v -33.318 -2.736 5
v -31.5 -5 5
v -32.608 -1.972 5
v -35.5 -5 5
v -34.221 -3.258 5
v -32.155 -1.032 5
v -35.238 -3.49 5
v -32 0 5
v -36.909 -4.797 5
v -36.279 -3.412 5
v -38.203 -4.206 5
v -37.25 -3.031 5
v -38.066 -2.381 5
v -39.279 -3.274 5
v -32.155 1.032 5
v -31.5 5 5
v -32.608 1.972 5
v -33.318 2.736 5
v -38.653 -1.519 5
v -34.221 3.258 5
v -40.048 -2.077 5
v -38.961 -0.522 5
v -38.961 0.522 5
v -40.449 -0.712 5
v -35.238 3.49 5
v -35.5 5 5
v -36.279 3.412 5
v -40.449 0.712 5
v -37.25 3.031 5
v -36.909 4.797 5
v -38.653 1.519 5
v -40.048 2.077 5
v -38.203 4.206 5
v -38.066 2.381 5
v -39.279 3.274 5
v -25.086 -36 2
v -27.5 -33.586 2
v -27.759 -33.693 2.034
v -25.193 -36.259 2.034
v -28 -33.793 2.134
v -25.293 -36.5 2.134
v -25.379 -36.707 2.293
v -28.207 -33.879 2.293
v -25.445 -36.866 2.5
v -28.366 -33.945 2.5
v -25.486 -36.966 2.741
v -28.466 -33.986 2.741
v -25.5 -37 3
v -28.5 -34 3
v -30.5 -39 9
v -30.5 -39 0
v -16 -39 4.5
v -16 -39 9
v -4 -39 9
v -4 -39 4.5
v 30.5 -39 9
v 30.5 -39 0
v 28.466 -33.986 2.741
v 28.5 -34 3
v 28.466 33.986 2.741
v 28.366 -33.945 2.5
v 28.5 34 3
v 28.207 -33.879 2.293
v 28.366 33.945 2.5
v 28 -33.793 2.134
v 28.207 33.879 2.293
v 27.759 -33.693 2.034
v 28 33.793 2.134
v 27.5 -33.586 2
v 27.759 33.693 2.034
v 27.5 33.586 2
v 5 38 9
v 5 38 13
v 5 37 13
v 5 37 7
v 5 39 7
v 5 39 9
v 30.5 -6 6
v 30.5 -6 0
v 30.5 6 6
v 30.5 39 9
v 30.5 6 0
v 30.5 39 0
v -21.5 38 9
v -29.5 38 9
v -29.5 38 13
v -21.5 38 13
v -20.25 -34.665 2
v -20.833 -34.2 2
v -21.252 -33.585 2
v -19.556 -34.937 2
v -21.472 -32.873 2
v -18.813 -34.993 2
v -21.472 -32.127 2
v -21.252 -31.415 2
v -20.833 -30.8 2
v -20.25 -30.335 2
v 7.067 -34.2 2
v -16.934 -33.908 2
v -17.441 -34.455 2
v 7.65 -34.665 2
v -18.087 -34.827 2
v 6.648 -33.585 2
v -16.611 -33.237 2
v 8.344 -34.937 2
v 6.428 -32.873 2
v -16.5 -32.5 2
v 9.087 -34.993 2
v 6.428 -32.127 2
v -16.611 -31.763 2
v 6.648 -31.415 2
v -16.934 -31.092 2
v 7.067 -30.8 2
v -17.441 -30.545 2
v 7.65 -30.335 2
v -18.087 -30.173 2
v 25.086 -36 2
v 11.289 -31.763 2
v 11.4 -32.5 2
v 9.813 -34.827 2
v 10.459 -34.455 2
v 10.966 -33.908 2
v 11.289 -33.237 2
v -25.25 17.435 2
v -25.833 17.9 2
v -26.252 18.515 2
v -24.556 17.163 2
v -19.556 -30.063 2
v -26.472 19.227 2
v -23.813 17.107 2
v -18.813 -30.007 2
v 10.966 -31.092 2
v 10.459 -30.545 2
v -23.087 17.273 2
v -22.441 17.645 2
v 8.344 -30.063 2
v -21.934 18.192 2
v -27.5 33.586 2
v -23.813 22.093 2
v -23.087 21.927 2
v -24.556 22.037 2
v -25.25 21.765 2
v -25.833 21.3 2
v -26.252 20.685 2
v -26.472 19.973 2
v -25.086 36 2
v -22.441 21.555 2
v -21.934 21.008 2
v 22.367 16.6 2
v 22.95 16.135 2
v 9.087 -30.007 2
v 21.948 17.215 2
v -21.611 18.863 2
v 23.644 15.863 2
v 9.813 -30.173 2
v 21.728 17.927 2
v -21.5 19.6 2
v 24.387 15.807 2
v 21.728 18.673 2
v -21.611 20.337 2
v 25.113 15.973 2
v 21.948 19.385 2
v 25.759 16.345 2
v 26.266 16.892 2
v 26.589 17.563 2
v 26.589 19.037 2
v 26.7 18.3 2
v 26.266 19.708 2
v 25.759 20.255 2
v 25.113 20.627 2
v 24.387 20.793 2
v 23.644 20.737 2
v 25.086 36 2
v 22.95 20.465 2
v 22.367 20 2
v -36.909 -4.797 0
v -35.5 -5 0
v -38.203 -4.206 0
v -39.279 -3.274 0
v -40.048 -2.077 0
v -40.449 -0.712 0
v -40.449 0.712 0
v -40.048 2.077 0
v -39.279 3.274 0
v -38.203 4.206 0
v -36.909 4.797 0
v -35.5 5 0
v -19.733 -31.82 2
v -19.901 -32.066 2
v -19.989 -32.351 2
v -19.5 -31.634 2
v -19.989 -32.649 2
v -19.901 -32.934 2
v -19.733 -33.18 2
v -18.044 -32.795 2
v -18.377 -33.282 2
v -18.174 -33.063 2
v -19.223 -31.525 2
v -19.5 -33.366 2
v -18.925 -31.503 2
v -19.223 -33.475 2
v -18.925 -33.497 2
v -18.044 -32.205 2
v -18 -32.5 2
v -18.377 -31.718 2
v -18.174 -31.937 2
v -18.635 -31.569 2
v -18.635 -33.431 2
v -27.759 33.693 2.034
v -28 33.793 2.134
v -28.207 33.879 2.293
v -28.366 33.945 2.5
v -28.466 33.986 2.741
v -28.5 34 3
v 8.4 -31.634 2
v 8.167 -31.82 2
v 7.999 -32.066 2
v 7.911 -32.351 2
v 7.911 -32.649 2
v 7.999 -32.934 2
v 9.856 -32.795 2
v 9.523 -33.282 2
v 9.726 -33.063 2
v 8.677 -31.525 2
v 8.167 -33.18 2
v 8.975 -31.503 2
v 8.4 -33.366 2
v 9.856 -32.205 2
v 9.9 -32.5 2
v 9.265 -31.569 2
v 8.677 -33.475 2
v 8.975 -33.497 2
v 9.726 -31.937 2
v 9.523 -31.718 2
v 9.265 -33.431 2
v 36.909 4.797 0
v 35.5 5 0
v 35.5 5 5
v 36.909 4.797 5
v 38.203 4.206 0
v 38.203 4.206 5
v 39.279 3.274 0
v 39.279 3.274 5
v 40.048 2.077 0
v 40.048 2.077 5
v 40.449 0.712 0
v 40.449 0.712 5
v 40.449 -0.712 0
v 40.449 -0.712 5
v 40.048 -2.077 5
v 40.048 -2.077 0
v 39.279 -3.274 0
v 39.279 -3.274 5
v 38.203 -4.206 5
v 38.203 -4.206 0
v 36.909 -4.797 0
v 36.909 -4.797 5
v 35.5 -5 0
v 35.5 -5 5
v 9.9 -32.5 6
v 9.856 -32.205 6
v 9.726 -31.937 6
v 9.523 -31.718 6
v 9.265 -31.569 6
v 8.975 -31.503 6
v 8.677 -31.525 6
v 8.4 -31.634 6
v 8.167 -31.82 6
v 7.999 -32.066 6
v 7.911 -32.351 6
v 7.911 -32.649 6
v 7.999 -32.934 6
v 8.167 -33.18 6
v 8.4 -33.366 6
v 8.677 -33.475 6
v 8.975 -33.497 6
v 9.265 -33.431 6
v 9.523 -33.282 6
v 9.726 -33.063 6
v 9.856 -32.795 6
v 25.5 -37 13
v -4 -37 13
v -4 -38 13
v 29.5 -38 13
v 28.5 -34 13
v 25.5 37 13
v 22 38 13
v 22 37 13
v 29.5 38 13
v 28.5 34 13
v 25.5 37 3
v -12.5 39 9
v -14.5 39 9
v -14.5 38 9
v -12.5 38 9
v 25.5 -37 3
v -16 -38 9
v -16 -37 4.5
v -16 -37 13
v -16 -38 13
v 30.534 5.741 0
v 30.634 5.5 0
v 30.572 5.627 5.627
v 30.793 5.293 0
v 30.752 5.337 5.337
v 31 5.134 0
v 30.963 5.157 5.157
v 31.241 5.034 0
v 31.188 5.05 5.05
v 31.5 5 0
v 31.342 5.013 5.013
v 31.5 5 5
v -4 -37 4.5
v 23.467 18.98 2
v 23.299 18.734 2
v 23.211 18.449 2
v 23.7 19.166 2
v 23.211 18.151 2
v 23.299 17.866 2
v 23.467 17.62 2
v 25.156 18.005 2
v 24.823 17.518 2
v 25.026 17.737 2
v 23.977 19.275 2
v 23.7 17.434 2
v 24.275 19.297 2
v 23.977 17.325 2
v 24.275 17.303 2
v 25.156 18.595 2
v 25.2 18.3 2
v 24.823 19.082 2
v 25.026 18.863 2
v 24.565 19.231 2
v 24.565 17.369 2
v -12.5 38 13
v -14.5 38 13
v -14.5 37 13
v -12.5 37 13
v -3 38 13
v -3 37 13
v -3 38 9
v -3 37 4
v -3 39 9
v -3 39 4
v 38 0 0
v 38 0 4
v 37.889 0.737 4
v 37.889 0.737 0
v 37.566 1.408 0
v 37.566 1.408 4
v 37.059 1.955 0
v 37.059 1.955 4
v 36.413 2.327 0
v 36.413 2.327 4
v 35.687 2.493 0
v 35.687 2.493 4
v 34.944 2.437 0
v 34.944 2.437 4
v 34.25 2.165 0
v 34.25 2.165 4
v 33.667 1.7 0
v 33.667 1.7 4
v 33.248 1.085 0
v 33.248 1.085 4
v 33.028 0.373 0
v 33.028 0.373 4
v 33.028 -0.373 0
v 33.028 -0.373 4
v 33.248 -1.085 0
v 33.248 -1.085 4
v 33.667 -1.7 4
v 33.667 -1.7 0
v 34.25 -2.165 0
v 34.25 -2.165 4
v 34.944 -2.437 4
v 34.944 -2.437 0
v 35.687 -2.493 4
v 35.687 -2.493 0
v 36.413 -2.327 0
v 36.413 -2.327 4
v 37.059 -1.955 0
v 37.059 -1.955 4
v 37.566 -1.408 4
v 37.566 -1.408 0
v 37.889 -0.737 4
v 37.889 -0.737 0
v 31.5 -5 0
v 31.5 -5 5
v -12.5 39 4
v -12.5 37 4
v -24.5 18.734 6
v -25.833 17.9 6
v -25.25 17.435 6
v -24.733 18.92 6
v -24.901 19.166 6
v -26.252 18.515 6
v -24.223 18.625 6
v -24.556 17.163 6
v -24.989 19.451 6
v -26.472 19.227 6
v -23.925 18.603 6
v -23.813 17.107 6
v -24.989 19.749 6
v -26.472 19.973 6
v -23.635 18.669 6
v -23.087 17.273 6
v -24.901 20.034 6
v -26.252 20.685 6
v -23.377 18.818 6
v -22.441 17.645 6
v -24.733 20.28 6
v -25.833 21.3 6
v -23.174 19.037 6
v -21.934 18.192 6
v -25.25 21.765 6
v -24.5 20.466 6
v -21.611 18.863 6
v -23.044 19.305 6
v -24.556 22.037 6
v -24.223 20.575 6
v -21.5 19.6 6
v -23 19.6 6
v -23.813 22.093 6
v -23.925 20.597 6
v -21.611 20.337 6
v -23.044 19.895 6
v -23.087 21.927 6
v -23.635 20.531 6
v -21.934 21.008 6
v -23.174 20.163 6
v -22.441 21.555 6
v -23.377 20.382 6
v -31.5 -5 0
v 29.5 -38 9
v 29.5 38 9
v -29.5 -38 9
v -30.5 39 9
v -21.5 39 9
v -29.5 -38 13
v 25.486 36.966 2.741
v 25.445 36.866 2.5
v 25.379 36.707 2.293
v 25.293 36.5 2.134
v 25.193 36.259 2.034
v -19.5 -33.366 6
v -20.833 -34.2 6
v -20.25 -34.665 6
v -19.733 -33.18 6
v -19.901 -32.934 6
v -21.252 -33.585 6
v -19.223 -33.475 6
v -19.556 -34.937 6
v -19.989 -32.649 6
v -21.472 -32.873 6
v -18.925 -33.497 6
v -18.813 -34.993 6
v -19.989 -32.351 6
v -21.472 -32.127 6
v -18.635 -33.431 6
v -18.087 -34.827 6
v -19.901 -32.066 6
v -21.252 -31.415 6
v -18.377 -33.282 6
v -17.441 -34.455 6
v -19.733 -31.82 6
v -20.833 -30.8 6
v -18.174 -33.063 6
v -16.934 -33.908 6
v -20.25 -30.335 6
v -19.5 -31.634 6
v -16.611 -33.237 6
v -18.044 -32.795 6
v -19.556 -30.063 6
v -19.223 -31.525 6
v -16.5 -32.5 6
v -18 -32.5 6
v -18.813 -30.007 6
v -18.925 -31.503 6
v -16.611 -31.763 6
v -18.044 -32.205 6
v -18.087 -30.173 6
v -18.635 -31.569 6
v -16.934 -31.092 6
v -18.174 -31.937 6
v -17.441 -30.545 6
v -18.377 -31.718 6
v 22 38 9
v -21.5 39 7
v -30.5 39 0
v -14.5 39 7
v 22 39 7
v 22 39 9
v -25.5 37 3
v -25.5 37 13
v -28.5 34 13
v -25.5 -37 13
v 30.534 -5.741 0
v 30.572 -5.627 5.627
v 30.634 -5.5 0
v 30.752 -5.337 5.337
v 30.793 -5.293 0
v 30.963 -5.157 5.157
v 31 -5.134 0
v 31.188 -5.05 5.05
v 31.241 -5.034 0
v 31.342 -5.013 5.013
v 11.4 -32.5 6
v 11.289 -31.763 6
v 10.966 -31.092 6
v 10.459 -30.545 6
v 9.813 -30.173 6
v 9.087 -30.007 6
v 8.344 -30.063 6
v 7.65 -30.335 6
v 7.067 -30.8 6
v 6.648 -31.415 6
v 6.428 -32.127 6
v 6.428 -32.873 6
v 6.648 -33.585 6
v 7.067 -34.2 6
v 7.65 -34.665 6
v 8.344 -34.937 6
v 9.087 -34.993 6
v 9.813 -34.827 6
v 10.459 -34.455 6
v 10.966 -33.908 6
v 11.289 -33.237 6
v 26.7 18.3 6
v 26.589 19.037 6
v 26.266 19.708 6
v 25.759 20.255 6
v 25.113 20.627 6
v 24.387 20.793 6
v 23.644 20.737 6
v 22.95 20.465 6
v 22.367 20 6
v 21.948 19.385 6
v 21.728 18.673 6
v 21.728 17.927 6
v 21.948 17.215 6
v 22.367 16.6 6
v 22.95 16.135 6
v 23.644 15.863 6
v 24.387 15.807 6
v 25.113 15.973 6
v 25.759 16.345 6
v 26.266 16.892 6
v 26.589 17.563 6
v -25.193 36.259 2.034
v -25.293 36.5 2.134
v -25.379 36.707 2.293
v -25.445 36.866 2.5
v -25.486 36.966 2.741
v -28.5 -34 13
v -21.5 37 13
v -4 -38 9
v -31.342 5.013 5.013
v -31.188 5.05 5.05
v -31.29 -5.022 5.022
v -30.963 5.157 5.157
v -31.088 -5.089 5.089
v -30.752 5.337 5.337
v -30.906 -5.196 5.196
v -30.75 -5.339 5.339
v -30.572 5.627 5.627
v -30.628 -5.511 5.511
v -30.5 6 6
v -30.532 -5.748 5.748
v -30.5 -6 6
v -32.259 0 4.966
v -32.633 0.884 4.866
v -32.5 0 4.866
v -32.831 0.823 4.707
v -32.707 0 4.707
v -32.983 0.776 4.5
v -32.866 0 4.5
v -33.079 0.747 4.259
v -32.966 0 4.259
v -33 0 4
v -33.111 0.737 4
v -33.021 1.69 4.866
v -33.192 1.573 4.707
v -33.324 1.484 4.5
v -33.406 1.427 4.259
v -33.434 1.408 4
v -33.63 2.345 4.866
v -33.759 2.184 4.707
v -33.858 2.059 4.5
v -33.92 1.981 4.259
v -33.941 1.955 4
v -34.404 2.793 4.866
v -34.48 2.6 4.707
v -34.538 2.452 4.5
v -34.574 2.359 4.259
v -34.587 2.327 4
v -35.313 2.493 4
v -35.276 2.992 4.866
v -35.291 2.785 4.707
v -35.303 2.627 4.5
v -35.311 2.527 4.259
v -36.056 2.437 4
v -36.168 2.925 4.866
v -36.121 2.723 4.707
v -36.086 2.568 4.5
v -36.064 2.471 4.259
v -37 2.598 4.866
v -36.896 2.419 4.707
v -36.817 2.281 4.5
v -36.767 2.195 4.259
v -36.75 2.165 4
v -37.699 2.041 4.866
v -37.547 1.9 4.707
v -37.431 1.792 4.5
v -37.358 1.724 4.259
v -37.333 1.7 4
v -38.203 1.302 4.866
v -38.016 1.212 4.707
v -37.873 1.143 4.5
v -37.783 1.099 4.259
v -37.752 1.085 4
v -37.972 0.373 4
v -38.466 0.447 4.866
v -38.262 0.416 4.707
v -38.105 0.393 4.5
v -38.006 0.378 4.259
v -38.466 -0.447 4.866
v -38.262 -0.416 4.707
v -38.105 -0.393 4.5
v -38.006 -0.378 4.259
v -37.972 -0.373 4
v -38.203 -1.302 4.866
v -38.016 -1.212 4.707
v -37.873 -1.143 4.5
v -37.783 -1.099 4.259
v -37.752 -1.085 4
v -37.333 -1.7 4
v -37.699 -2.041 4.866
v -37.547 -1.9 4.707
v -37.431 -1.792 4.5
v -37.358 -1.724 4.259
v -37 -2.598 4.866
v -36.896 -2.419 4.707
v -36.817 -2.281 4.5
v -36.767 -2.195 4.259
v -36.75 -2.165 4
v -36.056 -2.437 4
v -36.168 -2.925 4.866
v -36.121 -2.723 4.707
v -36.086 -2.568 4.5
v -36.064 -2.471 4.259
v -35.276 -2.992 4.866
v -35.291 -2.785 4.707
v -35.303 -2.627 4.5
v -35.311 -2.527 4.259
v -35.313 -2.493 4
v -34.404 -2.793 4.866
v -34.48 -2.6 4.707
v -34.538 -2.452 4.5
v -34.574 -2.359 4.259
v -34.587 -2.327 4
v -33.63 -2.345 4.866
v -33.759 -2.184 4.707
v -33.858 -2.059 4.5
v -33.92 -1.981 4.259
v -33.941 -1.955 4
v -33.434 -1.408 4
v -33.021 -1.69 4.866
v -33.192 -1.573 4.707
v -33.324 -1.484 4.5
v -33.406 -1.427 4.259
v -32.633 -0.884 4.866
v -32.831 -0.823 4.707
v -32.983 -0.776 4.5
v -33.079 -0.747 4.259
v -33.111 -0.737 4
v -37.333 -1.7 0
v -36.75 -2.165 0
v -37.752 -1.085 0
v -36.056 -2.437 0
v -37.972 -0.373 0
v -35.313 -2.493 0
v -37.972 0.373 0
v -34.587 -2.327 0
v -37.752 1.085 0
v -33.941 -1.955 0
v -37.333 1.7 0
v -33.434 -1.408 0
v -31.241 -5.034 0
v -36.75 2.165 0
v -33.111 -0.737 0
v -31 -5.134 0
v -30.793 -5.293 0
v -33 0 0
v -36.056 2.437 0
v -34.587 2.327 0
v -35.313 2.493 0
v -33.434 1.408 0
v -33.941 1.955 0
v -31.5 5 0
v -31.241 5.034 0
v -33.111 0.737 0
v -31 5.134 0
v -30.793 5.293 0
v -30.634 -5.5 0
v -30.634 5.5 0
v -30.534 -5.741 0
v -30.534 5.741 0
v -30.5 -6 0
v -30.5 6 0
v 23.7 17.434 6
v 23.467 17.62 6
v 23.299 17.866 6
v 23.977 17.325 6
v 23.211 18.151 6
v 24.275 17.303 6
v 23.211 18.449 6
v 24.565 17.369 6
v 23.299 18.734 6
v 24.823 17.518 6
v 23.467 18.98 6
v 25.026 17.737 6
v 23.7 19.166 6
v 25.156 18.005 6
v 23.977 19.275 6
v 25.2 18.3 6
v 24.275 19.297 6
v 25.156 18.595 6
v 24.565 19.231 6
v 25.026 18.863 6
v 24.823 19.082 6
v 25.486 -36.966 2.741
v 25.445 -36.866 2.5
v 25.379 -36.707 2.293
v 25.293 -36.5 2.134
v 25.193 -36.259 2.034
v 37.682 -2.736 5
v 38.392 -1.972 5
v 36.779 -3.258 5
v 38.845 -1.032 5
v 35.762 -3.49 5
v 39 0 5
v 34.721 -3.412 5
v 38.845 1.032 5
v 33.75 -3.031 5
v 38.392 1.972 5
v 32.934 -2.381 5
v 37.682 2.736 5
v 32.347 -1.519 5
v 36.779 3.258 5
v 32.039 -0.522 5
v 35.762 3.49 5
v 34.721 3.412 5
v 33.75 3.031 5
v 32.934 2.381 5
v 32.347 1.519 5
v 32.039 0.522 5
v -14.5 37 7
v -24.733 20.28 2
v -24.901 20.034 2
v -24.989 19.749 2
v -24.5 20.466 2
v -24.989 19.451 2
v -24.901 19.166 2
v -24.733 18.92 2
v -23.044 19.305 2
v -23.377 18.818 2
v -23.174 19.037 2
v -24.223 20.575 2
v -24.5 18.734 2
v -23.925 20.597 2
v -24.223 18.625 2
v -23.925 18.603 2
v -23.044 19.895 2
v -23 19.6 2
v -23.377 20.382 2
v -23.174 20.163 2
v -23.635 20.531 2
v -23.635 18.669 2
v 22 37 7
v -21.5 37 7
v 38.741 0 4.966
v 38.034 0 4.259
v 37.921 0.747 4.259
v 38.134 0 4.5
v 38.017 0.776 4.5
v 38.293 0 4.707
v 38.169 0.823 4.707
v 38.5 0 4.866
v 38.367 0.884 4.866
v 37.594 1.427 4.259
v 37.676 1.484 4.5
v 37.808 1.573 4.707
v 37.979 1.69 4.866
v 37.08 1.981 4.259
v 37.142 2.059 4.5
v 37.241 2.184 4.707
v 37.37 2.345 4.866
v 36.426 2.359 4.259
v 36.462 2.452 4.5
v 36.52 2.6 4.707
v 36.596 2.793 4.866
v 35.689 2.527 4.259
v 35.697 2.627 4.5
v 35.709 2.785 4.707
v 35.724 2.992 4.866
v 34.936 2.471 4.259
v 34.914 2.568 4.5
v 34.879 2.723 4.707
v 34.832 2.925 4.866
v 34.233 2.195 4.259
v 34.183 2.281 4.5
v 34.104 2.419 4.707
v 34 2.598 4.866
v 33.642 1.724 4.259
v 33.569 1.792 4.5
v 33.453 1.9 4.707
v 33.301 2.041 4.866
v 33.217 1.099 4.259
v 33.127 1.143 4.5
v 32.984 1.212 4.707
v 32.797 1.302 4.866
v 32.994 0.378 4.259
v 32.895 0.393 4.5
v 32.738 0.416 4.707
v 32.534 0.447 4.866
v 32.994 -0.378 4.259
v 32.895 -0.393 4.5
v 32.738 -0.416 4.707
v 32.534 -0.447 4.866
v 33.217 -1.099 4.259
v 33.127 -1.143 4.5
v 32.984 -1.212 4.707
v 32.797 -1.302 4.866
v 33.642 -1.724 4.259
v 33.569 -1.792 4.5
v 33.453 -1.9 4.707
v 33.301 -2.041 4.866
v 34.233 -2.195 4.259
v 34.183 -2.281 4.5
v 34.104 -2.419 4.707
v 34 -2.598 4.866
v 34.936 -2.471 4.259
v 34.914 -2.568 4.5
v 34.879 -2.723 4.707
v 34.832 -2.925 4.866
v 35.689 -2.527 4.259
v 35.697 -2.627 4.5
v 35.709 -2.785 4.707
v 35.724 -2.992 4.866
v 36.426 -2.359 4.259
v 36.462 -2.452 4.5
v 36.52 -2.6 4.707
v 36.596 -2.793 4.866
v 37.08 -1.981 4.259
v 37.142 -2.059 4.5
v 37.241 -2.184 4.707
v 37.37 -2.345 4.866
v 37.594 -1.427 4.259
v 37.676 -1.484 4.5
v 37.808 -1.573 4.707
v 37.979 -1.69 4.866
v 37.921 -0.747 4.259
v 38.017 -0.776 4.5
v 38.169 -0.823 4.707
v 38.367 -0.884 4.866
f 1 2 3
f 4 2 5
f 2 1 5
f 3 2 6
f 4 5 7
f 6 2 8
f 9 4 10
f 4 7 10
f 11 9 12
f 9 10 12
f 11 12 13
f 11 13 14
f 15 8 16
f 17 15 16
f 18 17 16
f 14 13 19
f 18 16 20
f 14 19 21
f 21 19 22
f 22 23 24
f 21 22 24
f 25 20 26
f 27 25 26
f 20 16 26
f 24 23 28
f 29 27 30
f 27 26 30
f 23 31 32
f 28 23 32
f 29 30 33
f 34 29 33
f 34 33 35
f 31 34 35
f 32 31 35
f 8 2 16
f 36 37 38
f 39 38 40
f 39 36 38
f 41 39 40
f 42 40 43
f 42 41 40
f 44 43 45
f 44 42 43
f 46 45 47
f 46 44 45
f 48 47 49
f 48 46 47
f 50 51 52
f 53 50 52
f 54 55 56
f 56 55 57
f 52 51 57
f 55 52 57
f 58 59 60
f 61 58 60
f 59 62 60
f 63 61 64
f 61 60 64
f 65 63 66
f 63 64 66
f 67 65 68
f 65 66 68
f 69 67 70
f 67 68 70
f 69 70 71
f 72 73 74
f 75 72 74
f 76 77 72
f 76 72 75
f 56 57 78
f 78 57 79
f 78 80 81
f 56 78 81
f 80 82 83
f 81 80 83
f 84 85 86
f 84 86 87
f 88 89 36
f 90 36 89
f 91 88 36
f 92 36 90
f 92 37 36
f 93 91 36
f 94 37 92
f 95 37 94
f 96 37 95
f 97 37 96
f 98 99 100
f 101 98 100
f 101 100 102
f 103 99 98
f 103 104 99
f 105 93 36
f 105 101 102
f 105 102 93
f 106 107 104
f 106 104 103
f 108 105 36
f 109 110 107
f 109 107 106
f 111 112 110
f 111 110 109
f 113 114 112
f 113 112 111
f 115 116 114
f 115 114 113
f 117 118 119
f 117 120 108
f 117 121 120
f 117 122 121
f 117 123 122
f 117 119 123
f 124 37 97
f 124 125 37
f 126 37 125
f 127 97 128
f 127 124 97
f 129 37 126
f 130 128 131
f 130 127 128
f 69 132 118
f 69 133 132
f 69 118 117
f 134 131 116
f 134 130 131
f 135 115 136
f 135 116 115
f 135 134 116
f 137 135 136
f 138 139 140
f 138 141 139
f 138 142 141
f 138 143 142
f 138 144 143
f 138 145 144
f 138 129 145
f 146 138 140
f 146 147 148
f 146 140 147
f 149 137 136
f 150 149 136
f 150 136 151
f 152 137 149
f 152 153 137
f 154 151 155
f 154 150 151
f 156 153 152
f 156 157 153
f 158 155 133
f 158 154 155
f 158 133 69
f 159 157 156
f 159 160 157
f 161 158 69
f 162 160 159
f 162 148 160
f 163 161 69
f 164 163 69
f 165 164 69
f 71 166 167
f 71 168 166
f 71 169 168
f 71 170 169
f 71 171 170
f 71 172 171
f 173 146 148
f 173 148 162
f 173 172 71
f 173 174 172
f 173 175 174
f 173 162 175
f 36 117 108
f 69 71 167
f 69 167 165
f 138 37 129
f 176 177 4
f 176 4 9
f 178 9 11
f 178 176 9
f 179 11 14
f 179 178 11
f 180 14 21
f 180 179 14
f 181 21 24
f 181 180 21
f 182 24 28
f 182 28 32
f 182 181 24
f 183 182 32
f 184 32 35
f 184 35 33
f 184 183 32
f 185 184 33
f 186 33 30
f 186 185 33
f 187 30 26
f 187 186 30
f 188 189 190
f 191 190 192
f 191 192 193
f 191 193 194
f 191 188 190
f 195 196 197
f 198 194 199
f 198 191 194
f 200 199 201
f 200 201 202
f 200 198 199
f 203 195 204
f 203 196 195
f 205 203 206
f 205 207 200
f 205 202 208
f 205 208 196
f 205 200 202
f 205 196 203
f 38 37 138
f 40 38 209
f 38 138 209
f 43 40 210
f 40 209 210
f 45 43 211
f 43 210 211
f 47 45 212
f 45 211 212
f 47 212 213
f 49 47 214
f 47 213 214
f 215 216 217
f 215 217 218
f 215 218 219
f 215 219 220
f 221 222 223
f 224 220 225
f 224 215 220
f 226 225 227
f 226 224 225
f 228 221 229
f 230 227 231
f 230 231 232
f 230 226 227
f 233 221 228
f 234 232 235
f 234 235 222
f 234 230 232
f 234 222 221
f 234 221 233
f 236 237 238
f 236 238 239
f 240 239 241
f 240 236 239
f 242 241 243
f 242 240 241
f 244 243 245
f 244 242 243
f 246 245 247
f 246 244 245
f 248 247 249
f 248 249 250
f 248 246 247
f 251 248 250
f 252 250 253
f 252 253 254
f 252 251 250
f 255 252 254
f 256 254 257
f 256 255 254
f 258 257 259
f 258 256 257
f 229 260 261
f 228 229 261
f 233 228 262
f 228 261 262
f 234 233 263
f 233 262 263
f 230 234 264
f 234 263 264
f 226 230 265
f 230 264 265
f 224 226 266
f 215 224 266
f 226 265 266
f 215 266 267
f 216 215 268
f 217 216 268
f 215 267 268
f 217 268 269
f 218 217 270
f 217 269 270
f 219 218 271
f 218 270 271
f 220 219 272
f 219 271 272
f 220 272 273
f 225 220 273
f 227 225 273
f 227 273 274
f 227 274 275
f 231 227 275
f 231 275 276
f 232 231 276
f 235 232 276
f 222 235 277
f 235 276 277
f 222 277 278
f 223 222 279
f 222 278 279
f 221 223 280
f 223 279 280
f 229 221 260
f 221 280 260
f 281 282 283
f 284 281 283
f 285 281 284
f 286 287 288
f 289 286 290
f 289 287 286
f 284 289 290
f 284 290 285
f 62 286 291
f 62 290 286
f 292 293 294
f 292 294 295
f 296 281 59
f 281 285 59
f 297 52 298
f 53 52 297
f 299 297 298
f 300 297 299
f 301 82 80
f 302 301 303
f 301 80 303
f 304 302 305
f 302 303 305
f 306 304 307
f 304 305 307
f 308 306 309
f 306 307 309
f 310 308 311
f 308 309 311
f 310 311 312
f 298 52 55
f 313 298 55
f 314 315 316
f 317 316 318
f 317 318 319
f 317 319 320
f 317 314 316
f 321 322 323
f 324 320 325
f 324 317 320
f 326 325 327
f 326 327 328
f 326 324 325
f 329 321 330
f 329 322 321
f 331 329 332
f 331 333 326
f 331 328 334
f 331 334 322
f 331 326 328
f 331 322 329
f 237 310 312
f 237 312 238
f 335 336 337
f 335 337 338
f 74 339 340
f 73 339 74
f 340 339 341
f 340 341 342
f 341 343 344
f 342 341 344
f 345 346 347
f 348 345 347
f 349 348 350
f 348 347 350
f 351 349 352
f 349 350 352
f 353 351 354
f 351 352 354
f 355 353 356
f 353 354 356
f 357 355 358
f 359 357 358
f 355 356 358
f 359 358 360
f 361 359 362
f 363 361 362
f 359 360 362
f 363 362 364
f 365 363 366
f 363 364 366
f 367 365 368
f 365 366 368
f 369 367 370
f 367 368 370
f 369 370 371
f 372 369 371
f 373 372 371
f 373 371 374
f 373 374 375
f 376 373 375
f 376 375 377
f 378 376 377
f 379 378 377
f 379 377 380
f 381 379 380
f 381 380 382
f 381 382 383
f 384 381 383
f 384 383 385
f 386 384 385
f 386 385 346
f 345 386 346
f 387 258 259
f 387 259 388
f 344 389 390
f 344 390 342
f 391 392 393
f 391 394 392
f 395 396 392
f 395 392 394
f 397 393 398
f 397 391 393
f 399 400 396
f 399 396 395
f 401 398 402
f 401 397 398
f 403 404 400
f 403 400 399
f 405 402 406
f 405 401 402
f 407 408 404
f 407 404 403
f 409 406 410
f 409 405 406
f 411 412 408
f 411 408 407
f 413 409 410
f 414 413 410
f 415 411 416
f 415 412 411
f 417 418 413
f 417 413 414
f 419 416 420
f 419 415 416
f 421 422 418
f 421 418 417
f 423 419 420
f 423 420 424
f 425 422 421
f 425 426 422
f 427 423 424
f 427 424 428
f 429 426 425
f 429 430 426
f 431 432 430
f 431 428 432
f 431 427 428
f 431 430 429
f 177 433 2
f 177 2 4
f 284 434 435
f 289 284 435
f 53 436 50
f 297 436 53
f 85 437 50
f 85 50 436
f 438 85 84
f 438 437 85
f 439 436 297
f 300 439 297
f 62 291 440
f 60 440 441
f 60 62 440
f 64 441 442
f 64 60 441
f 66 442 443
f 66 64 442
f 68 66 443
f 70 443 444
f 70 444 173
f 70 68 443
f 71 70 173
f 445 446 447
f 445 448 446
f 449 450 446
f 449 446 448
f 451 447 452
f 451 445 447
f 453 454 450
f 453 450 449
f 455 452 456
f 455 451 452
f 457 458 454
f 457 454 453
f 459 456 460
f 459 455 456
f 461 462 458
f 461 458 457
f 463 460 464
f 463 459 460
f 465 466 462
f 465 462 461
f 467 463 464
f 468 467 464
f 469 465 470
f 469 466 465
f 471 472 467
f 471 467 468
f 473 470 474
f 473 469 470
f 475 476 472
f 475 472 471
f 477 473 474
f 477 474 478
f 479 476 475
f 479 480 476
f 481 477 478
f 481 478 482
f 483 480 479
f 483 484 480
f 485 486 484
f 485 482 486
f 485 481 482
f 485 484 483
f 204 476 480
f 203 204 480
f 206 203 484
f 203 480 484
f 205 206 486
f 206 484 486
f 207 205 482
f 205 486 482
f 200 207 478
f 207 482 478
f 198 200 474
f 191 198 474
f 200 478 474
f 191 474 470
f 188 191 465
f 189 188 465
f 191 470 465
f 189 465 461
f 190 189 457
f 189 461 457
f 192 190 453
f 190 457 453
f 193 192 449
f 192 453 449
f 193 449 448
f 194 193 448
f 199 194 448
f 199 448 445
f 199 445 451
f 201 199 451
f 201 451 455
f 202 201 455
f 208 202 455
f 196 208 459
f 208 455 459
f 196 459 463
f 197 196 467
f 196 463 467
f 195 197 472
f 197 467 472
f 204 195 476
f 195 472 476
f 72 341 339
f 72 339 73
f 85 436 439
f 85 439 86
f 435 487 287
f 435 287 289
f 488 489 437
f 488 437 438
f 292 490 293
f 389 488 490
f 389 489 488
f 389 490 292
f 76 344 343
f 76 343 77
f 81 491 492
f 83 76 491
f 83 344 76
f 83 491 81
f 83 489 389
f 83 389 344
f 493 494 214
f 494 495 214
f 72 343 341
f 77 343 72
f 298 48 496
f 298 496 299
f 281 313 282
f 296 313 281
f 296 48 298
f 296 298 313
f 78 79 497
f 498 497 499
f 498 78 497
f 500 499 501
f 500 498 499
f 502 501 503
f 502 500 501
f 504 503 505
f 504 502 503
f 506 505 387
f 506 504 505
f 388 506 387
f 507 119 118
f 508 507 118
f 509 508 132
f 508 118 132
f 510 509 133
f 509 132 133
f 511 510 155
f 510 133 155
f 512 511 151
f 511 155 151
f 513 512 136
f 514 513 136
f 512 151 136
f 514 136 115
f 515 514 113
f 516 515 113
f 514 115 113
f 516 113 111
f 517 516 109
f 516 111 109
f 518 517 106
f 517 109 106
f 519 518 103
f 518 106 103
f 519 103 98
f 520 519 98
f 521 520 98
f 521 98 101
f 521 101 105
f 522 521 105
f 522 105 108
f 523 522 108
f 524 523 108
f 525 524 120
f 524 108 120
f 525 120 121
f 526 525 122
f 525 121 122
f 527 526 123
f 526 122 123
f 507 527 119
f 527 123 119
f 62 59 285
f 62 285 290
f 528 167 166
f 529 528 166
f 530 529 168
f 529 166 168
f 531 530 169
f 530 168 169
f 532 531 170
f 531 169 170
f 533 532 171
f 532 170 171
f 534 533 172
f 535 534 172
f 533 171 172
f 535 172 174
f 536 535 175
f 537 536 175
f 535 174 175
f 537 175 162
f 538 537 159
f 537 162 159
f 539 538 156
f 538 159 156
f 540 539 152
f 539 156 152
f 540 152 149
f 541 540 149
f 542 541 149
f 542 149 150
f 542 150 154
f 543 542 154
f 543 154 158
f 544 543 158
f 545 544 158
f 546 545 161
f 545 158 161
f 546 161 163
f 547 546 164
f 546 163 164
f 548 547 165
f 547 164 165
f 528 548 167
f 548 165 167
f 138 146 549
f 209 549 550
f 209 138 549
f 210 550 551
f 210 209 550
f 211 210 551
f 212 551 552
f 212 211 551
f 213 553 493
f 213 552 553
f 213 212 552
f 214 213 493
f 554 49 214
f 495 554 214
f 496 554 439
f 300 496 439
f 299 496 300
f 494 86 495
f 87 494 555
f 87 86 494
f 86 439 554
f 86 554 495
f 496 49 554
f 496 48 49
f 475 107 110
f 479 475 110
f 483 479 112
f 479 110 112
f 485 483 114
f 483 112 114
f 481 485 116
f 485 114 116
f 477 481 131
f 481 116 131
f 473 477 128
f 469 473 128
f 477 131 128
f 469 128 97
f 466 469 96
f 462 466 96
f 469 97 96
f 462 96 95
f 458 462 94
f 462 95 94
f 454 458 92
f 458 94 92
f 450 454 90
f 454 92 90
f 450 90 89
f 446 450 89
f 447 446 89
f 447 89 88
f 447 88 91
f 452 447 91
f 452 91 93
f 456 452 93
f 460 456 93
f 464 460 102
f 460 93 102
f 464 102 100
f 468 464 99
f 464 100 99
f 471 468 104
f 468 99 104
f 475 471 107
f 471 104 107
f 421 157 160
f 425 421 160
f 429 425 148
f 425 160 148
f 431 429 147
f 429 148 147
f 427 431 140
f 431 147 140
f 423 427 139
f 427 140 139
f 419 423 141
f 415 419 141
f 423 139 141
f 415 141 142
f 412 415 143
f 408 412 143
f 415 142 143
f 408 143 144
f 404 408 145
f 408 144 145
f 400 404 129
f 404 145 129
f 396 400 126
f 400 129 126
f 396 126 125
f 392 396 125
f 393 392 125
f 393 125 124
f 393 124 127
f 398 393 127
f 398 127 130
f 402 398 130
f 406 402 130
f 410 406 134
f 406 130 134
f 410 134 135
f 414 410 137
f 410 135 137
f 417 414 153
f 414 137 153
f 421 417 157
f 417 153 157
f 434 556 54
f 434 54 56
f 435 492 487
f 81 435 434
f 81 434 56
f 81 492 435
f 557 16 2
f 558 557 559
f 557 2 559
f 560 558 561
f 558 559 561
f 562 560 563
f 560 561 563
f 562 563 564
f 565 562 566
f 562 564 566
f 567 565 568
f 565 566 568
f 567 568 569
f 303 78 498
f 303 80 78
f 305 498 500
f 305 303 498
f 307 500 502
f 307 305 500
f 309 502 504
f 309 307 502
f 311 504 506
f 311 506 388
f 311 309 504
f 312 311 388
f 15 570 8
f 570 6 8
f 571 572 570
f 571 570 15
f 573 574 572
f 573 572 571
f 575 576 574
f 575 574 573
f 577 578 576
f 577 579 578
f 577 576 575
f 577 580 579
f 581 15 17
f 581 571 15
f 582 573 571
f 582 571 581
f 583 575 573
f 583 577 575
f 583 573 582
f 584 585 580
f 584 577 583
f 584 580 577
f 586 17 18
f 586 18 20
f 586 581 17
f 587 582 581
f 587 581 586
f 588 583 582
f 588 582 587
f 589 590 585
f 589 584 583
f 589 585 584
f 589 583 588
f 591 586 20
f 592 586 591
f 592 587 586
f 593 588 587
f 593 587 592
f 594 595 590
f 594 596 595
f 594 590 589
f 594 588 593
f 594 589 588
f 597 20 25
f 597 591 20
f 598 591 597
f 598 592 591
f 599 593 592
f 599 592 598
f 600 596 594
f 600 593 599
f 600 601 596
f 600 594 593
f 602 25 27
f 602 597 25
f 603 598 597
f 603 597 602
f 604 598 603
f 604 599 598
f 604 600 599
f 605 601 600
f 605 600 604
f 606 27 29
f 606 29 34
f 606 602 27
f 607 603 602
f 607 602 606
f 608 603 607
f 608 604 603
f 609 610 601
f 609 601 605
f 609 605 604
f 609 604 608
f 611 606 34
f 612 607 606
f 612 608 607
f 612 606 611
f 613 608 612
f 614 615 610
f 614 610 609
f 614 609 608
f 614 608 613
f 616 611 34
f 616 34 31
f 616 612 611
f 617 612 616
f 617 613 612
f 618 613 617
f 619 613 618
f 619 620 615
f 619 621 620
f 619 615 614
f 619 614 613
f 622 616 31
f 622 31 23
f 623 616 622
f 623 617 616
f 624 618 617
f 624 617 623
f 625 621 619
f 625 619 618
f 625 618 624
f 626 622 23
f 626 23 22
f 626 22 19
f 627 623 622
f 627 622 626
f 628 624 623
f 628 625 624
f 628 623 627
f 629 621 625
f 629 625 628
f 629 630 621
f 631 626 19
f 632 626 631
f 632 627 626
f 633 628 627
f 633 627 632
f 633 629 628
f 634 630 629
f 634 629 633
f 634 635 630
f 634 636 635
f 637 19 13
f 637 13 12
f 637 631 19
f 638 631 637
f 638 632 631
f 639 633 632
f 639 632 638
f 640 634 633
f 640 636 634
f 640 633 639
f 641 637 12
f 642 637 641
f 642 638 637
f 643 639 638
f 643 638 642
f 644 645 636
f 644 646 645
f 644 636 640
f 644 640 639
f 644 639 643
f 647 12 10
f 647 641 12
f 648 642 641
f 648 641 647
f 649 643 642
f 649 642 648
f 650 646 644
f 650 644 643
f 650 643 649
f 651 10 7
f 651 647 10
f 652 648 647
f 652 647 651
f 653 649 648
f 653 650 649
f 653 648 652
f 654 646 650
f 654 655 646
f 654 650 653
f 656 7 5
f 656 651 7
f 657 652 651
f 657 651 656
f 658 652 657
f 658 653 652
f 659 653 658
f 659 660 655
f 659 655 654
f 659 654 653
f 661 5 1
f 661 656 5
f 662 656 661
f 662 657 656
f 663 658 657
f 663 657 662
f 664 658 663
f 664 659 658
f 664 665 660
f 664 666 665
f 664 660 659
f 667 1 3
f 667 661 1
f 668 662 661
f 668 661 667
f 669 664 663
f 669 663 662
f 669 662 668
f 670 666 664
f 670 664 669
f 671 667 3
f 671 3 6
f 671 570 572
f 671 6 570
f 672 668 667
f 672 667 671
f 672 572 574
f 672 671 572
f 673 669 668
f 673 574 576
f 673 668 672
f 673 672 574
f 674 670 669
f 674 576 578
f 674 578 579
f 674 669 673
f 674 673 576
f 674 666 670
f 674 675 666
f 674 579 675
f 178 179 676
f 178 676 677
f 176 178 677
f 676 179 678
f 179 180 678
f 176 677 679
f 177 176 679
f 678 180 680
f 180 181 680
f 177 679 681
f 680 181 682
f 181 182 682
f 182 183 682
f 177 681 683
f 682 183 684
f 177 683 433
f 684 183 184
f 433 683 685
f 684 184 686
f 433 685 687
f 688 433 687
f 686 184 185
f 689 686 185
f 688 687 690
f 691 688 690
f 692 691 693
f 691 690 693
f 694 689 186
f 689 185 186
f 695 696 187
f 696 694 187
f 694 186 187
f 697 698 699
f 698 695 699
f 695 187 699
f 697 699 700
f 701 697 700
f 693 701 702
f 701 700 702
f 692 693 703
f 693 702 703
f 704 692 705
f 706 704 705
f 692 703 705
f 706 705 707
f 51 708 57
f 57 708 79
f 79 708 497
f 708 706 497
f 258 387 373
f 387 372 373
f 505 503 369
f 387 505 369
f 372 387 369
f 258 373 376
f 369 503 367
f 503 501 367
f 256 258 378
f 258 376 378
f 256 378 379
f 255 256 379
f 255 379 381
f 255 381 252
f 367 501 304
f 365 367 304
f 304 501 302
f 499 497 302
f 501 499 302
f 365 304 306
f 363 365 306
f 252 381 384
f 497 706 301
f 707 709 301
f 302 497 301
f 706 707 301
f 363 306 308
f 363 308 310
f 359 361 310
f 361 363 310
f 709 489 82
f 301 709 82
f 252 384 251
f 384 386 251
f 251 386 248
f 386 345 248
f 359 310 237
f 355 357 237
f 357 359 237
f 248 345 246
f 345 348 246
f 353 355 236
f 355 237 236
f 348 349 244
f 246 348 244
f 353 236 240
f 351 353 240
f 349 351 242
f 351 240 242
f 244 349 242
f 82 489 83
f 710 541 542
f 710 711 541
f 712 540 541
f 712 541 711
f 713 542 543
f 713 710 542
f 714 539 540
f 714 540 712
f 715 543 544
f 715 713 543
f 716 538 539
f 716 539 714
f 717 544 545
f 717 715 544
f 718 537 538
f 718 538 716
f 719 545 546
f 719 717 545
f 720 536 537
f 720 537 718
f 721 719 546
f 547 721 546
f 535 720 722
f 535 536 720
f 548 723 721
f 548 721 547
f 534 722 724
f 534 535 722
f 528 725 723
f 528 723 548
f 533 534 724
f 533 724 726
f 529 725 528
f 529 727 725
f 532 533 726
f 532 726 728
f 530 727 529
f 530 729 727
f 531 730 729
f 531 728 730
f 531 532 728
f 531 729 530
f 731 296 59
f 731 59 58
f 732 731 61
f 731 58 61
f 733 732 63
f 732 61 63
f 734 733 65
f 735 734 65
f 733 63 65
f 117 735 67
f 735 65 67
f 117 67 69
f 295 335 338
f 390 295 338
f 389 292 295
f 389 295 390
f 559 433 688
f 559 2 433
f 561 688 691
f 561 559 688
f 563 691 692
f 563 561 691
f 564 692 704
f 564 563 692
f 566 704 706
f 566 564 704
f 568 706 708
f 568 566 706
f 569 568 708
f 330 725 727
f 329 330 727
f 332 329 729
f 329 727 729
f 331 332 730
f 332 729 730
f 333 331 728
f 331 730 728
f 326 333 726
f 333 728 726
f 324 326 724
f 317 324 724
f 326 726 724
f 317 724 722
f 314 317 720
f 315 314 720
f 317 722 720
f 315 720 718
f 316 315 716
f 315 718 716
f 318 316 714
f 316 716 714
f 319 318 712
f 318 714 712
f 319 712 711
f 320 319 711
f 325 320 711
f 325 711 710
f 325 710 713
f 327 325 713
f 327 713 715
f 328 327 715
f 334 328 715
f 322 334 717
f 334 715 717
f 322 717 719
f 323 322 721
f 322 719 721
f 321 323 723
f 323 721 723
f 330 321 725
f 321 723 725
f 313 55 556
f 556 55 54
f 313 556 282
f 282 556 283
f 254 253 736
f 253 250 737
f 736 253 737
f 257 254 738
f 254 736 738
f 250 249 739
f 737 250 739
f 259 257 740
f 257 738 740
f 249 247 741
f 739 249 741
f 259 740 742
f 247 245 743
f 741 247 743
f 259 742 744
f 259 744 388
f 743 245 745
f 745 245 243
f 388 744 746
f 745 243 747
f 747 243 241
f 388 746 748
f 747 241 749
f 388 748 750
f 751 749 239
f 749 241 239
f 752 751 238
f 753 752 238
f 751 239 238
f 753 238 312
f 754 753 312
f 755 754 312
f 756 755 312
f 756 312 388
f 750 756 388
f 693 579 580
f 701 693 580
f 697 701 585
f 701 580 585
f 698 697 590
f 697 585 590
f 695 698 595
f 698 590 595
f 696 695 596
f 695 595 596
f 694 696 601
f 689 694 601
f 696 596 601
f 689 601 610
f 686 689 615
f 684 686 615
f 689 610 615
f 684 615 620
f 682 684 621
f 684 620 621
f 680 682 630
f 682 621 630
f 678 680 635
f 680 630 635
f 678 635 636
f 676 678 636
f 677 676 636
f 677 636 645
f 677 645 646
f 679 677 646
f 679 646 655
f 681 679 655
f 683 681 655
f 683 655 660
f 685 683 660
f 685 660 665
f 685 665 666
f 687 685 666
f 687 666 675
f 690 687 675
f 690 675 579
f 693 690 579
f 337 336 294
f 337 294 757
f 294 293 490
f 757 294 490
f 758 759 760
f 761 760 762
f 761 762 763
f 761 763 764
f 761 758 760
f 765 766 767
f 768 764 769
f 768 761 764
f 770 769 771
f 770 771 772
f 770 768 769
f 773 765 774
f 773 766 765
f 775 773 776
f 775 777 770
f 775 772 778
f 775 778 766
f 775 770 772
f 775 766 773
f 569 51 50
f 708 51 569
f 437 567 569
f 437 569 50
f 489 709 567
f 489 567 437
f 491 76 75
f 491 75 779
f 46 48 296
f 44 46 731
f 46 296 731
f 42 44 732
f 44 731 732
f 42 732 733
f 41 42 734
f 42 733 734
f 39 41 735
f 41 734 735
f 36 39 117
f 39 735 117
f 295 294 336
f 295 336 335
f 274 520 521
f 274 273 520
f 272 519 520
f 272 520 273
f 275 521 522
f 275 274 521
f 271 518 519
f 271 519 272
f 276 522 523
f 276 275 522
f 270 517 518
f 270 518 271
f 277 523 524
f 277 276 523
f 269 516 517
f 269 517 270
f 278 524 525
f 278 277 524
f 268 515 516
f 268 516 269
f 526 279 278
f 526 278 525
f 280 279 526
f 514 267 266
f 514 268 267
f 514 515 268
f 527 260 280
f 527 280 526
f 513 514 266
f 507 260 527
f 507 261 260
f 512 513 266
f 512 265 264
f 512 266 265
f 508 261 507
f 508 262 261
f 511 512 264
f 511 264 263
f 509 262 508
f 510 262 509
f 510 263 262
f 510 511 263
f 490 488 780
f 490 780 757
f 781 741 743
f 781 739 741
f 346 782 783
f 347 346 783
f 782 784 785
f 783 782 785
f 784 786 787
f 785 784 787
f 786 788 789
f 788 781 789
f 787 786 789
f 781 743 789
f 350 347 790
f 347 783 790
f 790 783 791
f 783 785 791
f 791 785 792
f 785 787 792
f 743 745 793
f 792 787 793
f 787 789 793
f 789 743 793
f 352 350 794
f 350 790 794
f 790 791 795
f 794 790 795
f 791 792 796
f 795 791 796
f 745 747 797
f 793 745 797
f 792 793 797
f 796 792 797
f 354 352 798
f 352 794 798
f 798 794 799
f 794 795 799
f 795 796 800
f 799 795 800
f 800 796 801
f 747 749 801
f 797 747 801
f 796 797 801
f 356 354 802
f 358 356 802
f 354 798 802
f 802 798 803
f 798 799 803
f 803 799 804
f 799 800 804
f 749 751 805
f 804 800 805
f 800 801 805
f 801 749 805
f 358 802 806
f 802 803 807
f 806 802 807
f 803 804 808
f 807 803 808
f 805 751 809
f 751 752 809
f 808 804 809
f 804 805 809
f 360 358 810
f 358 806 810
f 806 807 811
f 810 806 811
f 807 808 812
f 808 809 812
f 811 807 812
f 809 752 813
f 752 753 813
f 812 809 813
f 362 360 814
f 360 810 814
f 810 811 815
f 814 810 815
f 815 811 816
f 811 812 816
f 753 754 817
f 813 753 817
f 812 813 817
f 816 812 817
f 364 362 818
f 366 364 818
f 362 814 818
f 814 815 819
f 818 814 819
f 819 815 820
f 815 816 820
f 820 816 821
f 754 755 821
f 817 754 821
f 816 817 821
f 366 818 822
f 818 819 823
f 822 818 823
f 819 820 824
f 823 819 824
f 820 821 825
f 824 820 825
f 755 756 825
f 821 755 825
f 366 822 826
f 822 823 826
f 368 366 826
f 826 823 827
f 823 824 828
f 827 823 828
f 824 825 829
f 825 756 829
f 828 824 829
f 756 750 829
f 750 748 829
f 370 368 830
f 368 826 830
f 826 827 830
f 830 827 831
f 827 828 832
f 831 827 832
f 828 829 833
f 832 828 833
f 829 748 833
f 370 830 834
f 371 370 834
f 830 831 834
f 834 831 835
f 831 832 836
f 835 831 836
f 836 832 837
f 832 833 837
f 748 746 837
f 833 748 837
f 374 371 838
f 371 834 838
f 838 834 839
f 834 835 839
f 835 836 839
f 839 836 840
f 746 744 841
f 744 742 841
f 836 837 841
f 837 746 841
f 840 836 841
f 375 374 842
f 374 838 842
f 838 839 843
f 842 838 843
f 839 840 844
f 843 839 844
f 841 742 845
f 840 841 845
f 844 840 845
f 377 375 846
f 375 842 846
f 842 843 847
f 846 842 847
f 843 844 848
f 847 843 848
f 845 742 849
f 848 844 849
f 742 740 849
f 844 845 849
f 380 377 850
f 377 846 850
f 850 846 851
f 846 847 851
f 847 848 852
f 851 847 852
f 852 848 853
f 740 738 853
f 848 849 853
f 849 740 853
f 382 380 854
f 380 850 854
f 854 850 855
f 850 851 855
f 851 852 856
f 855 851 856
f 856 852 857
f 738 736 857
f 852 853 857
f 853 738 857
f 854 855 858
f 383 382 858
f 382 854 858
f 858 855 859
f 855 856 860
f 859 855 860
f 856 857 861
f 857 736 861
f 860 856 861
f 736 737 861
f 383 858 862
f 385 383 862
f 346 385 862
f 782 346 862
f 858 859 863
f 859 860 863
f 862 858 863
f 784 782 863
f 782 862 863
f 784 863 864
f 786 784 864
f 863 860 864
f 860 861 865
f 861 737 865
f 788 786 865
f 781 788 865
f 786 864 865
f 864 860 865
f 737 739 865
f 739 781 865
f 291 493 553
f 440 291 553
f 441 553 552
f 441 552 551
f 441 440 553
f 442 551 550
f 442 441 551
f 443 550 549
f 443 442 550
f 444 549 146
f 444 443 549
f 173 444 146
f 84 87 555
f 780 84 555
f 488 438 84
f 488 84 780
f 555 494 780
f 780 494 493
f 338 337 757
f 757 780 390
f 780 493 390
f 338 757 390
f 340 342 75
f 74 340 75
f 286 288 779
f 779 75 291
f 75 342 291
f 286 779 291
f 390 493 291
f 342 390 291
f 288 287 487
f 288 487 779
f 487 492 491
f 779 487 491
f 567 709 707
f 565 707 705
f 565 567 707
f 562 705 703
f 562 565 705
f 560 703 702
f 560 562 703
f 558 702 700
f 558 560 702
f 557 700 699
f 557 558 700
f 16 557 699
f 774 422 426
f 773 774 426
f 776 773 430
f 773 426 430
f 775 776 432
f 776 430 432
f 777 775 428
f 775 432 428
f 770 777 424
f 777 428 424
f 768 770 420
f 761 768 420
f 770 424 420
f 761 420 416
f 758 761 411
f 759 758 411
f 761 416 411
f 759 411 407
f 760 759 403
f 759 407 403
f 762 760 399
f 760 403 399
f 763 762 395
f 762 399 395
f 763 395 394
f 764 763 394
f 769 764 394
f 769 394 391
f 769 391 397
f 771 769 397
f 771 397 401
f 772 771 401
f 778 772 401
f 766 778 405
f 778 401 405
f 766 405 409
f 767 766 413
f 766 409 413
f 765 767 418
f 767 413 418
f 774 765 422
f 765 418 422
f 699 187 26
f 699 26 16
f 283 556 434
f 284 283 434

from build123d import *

# Parameters (mm, degrees)
ESQUISSE1_W             = 61
ESQUISSE1_H             = 78
BOSS_EXTRU_1_DEPTH      = 2
ESQUISSE2_W             = 61
ESQUISSE2_H             = 78
ESQUISSE2_W_2           = 57
ESQUISSE2_H_2           = 74
BOSS_EXTRU_2_DEPTH      = 7
ESQUISSE3_W             = 59
ESQUISSE3_H             = 76
ESQUISSE3_W_2           = 57
ESQUISSE3_H_2           = 74
BOSS_EXTRU_3_DEPTH      = 4
ESQUISSE4_R             = 2.5
BOSS_EXTRU_4_DEPTH      = 4
ESQUISSE6_W             = 12
ESQUISSE6_H             = 20
ENL_V_MAT_EXTRU_1_DEPTH = 3
ESQUISSE7_W             = 17
ESQUISSE7_H             = 13
ESQUISSE7_W_2           = 9.5
ESQUISSE7_H_2           = 16
ESQUISSE7_W_3           = 7
ENL_V_MAT_EXTRU_2_DEPTH = 3
ESQUISSE5_R             = 1
ENL_V_MAT_EXTRU_3_DEPTH = 4
CHANFREIN1_SIZE         = 3
BOSS_EXTRU_5_DEPTH      = 5
ENL_V_MAT_EXTRU_4_REACH = 7
ESQUISSE9_R             = 2.5
CONG_1_R                = 1
CONG_2_R                = 1
CONG_3_R                = 1


with BuildPart() as part:
    # Esquisse1 → Boss.-Extru.1 (new body)
    with BuildSketch(Plane.XY):
        Rectangle(ESQUISSE1_W, ESQUISSE1_H)
    extrude(amount=BOSS_EXTRU_1_DEPTH)

    # Esquisse2 → Boss.-Extru.2 (add)
    with BuildSketch(Plane.XY.offset(2)):
        Rectangle(ESQUISSE2_W, ESQUISSE2_H)
        Rectangle(ESQUISSE2_W_2, ESQUISSE2_H_2, mode=Mode.SUBTRACT)
    extrude(amount=BOSS_EXTRU_2_DEPTH)

    # Esquisse3 → Boss.-Extru.3 (add)
    with BuildSketch(Plane.XY.offset(9)):
        Rectangle(ESQUISSE3_W, ESQUISSE3_H)
        Rectangle(ESQUISSE3_W_2, ESQUISSE3_H_2, mode=Mode.SUBTRACT)
    extrude(amount=BOSS_EXTRU_3_DEPTH)

    # Esquisse4 → Boss.-Extru.4 (add)
    with BuildSketch(Plane.XY.offset(2)):
        with Locations((-24, 19.6)):
            Circle(ESQUISSE4_R)
        with Locations((24.2, 18.3)):
            Circle(ESQUISSE4_R)
        with Locations((8.9, -32.5)):
            Circle(ESQUISSE4_R)
        with Locations((-19, -32.5)):
            Circle(ESQUISSE4_R)
    extrude(amount=BOSS_EXTRU_4_DEPTH)

    # Esquisse6 → Enlèv. mat.-Extru.1 (cut)
    with BuildSketch(Plane.XZ.offset(39)):
        with Locations((-10, 14.5)):
            Rectangle(ESQUISSE6_W, ESQUISSE6_H)
    extrude(amount=-ENL_V_MAT_EXTRU_1_DEPTH, mode=Mode.SUBTRACT)

    # Esquisse7 → Enlèv. mat.-Extru.2 (cut)
    with BuildSketch(Plane(origin=(0, 39, 0), x_dir=(1, 0, 0), z_dir=(0, 1, 0))):
        with Locations((13.5, -13.5)):
            Rectangle(ESQUISSE7_W, ESQUISSE7_H)
        with Locations((-7.75, -12)):
            Rectangle(ESQUISSE7_W_2, ESQUISSE7_H_2)
        with Locations((-18, -13.5)):
            Rectangle(ESQUISSE7_W_3, ESQUISSE7_H)
    extrude(amount=-ENL_V_MAT_EXTRU_2_DEPTH, mode=Mode.SUBTRACT)

    # Esquisse5 → Enlèv. mat.-Extru.3 (cut)
    with BuildSketch(Plane.XY.offset(6)):
        with Locations((-24, 19.6)):
            Circle(ESQUISSE5_R)
        with Locations((24.2, 18.3)):
            Circle(ESQUISSE5_R)
        with Locations((8.9, -32.5)):
            Circle(ESQUISSE5_R)
        with Locations((-19, -32.5)):
            Circle(ESQUISSE5_R)
    extrude(amount=-ENL_V_MAT_EXTRU_3_DEPTH, mode=Mode.SUBTRACT)

    # Chanfrein1
    chanfrein1_edges = [part.edges().sort_by_distance(p)[0] for p in [
        (-28.5, -37, 7.5),
        (28.5, -37, 7.5),
        (28.5, 37, 7.5),
        (-28.5, 37, 7.5),
    ]]
    chamfer(chanfrein1_edges, length=CHANFREIN1_SIZE)

    # Esquisse8 → Boss.-Extru.5 (add)
    with BuildSketch(Plane(origin=(0, 0, 0), x_dir=(-1, 0, 0), z_dir=(0, 0, -1))):
        with BuildLine():
            Line((-30.5, 5), (-35.5, 5))
            ThreePointArc((-35.5, 5), (-40.5, 0), (-35.5, -5))
            Line((-35.5, -5), (-30.5, -5))
            Line((-30.5, -5), (-30.5, 5))
        make_face()
        with BuildLine():
            Line((30.5, -5), (35.5, -5))
            ThreePointArc((35.5, -5), (40.5, 0), (35.5, 5))
            Line((35.5, 5), (30.5, 5))
            Line((30.5, 5), (30.5, -5))
        make_face()
    extrude(amount=-BOSS_EXTRU_5_DEPTH)

    # Esquisse9 → Enlèv. mat.-Extru.4 (cut, up to next)
    with BuildSketch(Plane.XY.offset(5), mode=Mode.PRIVATE) as enl_v_mat_extru_4_sk1:
        with Locations((-35.5, 0)):
            Circle(ESQUISSE9_R)
    enl_v_mat_extru_4_tool1 = extrude(enl_v_mat_extru_4_sk1.sketch, amount=-ENL_V_MAT_EXTRU_4_REACH, mode=Mode.PRIVATE) & part.part
    add(enl_v_mat_extru_4_tool1.solids().sort_by_distance((-35.5, 0, 5))[0], mode=Mode.SUBTRACT)
    # Esquisse9 → Enlèv. mat.-Extru.4 (cut, up to next)
    with BuildSketch(Plane.XY.offset(5), mode=Mode.PRIVATE) as enl_v_mat_extru_4_sk2:
        with Locations((35.5, 0)):
            Circle(ESQUISSE9_R)
    enl_v_mat_extru_4_tool2 = extrude(enl_v_mat_extru_4_sk2.sketch, amount=-ENL_V_MAT_EXTRU_4_REACH, mode=Mode.PRIVATE) & part.part
    add(enl_v_mat_extru_4_tool2.solids().sort_by_distance((35.5, 0, 5))[0], mode=Mode.SUBTRACT)

    # Congé1
    cong_1_edges = [part.edges().sort_by_distance(p)[0] for p in [
        (-38, 0, 5),
        (33, 0, 5),
    ]]
    fillet(cong_1_edges, radius=CONG_1_R)

    # Congé2
    cong_2_edges = [part.edges().sort_by_distance(p)[0] for p in [
        (30.5, -5, 2.5),
        (30.5, 5, 2.5),
        (30.5, 0, 5),
        (-30.5, 5, 2.5),
        (-30.5, -5, 2.5),
        (-30.5, 0, 5),
    ]]
    fillet(cong_2_edges, radius=CONG_2_R)

    # Congé3
    cong_3_edges = [part.edges().sort_by_distance(p)[0] for p in [
        (0, -37, 2),
        (-28.5, 0, 2),
        (28.5, 0, 2),
        (0, 37, 2),
        (-27, -35.5, 2),
        (-27, 35.5, 2),
        (27, 35.5, 2),
        (27, -35.5, 2),
    ]]
    fillet(cong_3_edges, radius=CONG_3_R)


solid = part.part
